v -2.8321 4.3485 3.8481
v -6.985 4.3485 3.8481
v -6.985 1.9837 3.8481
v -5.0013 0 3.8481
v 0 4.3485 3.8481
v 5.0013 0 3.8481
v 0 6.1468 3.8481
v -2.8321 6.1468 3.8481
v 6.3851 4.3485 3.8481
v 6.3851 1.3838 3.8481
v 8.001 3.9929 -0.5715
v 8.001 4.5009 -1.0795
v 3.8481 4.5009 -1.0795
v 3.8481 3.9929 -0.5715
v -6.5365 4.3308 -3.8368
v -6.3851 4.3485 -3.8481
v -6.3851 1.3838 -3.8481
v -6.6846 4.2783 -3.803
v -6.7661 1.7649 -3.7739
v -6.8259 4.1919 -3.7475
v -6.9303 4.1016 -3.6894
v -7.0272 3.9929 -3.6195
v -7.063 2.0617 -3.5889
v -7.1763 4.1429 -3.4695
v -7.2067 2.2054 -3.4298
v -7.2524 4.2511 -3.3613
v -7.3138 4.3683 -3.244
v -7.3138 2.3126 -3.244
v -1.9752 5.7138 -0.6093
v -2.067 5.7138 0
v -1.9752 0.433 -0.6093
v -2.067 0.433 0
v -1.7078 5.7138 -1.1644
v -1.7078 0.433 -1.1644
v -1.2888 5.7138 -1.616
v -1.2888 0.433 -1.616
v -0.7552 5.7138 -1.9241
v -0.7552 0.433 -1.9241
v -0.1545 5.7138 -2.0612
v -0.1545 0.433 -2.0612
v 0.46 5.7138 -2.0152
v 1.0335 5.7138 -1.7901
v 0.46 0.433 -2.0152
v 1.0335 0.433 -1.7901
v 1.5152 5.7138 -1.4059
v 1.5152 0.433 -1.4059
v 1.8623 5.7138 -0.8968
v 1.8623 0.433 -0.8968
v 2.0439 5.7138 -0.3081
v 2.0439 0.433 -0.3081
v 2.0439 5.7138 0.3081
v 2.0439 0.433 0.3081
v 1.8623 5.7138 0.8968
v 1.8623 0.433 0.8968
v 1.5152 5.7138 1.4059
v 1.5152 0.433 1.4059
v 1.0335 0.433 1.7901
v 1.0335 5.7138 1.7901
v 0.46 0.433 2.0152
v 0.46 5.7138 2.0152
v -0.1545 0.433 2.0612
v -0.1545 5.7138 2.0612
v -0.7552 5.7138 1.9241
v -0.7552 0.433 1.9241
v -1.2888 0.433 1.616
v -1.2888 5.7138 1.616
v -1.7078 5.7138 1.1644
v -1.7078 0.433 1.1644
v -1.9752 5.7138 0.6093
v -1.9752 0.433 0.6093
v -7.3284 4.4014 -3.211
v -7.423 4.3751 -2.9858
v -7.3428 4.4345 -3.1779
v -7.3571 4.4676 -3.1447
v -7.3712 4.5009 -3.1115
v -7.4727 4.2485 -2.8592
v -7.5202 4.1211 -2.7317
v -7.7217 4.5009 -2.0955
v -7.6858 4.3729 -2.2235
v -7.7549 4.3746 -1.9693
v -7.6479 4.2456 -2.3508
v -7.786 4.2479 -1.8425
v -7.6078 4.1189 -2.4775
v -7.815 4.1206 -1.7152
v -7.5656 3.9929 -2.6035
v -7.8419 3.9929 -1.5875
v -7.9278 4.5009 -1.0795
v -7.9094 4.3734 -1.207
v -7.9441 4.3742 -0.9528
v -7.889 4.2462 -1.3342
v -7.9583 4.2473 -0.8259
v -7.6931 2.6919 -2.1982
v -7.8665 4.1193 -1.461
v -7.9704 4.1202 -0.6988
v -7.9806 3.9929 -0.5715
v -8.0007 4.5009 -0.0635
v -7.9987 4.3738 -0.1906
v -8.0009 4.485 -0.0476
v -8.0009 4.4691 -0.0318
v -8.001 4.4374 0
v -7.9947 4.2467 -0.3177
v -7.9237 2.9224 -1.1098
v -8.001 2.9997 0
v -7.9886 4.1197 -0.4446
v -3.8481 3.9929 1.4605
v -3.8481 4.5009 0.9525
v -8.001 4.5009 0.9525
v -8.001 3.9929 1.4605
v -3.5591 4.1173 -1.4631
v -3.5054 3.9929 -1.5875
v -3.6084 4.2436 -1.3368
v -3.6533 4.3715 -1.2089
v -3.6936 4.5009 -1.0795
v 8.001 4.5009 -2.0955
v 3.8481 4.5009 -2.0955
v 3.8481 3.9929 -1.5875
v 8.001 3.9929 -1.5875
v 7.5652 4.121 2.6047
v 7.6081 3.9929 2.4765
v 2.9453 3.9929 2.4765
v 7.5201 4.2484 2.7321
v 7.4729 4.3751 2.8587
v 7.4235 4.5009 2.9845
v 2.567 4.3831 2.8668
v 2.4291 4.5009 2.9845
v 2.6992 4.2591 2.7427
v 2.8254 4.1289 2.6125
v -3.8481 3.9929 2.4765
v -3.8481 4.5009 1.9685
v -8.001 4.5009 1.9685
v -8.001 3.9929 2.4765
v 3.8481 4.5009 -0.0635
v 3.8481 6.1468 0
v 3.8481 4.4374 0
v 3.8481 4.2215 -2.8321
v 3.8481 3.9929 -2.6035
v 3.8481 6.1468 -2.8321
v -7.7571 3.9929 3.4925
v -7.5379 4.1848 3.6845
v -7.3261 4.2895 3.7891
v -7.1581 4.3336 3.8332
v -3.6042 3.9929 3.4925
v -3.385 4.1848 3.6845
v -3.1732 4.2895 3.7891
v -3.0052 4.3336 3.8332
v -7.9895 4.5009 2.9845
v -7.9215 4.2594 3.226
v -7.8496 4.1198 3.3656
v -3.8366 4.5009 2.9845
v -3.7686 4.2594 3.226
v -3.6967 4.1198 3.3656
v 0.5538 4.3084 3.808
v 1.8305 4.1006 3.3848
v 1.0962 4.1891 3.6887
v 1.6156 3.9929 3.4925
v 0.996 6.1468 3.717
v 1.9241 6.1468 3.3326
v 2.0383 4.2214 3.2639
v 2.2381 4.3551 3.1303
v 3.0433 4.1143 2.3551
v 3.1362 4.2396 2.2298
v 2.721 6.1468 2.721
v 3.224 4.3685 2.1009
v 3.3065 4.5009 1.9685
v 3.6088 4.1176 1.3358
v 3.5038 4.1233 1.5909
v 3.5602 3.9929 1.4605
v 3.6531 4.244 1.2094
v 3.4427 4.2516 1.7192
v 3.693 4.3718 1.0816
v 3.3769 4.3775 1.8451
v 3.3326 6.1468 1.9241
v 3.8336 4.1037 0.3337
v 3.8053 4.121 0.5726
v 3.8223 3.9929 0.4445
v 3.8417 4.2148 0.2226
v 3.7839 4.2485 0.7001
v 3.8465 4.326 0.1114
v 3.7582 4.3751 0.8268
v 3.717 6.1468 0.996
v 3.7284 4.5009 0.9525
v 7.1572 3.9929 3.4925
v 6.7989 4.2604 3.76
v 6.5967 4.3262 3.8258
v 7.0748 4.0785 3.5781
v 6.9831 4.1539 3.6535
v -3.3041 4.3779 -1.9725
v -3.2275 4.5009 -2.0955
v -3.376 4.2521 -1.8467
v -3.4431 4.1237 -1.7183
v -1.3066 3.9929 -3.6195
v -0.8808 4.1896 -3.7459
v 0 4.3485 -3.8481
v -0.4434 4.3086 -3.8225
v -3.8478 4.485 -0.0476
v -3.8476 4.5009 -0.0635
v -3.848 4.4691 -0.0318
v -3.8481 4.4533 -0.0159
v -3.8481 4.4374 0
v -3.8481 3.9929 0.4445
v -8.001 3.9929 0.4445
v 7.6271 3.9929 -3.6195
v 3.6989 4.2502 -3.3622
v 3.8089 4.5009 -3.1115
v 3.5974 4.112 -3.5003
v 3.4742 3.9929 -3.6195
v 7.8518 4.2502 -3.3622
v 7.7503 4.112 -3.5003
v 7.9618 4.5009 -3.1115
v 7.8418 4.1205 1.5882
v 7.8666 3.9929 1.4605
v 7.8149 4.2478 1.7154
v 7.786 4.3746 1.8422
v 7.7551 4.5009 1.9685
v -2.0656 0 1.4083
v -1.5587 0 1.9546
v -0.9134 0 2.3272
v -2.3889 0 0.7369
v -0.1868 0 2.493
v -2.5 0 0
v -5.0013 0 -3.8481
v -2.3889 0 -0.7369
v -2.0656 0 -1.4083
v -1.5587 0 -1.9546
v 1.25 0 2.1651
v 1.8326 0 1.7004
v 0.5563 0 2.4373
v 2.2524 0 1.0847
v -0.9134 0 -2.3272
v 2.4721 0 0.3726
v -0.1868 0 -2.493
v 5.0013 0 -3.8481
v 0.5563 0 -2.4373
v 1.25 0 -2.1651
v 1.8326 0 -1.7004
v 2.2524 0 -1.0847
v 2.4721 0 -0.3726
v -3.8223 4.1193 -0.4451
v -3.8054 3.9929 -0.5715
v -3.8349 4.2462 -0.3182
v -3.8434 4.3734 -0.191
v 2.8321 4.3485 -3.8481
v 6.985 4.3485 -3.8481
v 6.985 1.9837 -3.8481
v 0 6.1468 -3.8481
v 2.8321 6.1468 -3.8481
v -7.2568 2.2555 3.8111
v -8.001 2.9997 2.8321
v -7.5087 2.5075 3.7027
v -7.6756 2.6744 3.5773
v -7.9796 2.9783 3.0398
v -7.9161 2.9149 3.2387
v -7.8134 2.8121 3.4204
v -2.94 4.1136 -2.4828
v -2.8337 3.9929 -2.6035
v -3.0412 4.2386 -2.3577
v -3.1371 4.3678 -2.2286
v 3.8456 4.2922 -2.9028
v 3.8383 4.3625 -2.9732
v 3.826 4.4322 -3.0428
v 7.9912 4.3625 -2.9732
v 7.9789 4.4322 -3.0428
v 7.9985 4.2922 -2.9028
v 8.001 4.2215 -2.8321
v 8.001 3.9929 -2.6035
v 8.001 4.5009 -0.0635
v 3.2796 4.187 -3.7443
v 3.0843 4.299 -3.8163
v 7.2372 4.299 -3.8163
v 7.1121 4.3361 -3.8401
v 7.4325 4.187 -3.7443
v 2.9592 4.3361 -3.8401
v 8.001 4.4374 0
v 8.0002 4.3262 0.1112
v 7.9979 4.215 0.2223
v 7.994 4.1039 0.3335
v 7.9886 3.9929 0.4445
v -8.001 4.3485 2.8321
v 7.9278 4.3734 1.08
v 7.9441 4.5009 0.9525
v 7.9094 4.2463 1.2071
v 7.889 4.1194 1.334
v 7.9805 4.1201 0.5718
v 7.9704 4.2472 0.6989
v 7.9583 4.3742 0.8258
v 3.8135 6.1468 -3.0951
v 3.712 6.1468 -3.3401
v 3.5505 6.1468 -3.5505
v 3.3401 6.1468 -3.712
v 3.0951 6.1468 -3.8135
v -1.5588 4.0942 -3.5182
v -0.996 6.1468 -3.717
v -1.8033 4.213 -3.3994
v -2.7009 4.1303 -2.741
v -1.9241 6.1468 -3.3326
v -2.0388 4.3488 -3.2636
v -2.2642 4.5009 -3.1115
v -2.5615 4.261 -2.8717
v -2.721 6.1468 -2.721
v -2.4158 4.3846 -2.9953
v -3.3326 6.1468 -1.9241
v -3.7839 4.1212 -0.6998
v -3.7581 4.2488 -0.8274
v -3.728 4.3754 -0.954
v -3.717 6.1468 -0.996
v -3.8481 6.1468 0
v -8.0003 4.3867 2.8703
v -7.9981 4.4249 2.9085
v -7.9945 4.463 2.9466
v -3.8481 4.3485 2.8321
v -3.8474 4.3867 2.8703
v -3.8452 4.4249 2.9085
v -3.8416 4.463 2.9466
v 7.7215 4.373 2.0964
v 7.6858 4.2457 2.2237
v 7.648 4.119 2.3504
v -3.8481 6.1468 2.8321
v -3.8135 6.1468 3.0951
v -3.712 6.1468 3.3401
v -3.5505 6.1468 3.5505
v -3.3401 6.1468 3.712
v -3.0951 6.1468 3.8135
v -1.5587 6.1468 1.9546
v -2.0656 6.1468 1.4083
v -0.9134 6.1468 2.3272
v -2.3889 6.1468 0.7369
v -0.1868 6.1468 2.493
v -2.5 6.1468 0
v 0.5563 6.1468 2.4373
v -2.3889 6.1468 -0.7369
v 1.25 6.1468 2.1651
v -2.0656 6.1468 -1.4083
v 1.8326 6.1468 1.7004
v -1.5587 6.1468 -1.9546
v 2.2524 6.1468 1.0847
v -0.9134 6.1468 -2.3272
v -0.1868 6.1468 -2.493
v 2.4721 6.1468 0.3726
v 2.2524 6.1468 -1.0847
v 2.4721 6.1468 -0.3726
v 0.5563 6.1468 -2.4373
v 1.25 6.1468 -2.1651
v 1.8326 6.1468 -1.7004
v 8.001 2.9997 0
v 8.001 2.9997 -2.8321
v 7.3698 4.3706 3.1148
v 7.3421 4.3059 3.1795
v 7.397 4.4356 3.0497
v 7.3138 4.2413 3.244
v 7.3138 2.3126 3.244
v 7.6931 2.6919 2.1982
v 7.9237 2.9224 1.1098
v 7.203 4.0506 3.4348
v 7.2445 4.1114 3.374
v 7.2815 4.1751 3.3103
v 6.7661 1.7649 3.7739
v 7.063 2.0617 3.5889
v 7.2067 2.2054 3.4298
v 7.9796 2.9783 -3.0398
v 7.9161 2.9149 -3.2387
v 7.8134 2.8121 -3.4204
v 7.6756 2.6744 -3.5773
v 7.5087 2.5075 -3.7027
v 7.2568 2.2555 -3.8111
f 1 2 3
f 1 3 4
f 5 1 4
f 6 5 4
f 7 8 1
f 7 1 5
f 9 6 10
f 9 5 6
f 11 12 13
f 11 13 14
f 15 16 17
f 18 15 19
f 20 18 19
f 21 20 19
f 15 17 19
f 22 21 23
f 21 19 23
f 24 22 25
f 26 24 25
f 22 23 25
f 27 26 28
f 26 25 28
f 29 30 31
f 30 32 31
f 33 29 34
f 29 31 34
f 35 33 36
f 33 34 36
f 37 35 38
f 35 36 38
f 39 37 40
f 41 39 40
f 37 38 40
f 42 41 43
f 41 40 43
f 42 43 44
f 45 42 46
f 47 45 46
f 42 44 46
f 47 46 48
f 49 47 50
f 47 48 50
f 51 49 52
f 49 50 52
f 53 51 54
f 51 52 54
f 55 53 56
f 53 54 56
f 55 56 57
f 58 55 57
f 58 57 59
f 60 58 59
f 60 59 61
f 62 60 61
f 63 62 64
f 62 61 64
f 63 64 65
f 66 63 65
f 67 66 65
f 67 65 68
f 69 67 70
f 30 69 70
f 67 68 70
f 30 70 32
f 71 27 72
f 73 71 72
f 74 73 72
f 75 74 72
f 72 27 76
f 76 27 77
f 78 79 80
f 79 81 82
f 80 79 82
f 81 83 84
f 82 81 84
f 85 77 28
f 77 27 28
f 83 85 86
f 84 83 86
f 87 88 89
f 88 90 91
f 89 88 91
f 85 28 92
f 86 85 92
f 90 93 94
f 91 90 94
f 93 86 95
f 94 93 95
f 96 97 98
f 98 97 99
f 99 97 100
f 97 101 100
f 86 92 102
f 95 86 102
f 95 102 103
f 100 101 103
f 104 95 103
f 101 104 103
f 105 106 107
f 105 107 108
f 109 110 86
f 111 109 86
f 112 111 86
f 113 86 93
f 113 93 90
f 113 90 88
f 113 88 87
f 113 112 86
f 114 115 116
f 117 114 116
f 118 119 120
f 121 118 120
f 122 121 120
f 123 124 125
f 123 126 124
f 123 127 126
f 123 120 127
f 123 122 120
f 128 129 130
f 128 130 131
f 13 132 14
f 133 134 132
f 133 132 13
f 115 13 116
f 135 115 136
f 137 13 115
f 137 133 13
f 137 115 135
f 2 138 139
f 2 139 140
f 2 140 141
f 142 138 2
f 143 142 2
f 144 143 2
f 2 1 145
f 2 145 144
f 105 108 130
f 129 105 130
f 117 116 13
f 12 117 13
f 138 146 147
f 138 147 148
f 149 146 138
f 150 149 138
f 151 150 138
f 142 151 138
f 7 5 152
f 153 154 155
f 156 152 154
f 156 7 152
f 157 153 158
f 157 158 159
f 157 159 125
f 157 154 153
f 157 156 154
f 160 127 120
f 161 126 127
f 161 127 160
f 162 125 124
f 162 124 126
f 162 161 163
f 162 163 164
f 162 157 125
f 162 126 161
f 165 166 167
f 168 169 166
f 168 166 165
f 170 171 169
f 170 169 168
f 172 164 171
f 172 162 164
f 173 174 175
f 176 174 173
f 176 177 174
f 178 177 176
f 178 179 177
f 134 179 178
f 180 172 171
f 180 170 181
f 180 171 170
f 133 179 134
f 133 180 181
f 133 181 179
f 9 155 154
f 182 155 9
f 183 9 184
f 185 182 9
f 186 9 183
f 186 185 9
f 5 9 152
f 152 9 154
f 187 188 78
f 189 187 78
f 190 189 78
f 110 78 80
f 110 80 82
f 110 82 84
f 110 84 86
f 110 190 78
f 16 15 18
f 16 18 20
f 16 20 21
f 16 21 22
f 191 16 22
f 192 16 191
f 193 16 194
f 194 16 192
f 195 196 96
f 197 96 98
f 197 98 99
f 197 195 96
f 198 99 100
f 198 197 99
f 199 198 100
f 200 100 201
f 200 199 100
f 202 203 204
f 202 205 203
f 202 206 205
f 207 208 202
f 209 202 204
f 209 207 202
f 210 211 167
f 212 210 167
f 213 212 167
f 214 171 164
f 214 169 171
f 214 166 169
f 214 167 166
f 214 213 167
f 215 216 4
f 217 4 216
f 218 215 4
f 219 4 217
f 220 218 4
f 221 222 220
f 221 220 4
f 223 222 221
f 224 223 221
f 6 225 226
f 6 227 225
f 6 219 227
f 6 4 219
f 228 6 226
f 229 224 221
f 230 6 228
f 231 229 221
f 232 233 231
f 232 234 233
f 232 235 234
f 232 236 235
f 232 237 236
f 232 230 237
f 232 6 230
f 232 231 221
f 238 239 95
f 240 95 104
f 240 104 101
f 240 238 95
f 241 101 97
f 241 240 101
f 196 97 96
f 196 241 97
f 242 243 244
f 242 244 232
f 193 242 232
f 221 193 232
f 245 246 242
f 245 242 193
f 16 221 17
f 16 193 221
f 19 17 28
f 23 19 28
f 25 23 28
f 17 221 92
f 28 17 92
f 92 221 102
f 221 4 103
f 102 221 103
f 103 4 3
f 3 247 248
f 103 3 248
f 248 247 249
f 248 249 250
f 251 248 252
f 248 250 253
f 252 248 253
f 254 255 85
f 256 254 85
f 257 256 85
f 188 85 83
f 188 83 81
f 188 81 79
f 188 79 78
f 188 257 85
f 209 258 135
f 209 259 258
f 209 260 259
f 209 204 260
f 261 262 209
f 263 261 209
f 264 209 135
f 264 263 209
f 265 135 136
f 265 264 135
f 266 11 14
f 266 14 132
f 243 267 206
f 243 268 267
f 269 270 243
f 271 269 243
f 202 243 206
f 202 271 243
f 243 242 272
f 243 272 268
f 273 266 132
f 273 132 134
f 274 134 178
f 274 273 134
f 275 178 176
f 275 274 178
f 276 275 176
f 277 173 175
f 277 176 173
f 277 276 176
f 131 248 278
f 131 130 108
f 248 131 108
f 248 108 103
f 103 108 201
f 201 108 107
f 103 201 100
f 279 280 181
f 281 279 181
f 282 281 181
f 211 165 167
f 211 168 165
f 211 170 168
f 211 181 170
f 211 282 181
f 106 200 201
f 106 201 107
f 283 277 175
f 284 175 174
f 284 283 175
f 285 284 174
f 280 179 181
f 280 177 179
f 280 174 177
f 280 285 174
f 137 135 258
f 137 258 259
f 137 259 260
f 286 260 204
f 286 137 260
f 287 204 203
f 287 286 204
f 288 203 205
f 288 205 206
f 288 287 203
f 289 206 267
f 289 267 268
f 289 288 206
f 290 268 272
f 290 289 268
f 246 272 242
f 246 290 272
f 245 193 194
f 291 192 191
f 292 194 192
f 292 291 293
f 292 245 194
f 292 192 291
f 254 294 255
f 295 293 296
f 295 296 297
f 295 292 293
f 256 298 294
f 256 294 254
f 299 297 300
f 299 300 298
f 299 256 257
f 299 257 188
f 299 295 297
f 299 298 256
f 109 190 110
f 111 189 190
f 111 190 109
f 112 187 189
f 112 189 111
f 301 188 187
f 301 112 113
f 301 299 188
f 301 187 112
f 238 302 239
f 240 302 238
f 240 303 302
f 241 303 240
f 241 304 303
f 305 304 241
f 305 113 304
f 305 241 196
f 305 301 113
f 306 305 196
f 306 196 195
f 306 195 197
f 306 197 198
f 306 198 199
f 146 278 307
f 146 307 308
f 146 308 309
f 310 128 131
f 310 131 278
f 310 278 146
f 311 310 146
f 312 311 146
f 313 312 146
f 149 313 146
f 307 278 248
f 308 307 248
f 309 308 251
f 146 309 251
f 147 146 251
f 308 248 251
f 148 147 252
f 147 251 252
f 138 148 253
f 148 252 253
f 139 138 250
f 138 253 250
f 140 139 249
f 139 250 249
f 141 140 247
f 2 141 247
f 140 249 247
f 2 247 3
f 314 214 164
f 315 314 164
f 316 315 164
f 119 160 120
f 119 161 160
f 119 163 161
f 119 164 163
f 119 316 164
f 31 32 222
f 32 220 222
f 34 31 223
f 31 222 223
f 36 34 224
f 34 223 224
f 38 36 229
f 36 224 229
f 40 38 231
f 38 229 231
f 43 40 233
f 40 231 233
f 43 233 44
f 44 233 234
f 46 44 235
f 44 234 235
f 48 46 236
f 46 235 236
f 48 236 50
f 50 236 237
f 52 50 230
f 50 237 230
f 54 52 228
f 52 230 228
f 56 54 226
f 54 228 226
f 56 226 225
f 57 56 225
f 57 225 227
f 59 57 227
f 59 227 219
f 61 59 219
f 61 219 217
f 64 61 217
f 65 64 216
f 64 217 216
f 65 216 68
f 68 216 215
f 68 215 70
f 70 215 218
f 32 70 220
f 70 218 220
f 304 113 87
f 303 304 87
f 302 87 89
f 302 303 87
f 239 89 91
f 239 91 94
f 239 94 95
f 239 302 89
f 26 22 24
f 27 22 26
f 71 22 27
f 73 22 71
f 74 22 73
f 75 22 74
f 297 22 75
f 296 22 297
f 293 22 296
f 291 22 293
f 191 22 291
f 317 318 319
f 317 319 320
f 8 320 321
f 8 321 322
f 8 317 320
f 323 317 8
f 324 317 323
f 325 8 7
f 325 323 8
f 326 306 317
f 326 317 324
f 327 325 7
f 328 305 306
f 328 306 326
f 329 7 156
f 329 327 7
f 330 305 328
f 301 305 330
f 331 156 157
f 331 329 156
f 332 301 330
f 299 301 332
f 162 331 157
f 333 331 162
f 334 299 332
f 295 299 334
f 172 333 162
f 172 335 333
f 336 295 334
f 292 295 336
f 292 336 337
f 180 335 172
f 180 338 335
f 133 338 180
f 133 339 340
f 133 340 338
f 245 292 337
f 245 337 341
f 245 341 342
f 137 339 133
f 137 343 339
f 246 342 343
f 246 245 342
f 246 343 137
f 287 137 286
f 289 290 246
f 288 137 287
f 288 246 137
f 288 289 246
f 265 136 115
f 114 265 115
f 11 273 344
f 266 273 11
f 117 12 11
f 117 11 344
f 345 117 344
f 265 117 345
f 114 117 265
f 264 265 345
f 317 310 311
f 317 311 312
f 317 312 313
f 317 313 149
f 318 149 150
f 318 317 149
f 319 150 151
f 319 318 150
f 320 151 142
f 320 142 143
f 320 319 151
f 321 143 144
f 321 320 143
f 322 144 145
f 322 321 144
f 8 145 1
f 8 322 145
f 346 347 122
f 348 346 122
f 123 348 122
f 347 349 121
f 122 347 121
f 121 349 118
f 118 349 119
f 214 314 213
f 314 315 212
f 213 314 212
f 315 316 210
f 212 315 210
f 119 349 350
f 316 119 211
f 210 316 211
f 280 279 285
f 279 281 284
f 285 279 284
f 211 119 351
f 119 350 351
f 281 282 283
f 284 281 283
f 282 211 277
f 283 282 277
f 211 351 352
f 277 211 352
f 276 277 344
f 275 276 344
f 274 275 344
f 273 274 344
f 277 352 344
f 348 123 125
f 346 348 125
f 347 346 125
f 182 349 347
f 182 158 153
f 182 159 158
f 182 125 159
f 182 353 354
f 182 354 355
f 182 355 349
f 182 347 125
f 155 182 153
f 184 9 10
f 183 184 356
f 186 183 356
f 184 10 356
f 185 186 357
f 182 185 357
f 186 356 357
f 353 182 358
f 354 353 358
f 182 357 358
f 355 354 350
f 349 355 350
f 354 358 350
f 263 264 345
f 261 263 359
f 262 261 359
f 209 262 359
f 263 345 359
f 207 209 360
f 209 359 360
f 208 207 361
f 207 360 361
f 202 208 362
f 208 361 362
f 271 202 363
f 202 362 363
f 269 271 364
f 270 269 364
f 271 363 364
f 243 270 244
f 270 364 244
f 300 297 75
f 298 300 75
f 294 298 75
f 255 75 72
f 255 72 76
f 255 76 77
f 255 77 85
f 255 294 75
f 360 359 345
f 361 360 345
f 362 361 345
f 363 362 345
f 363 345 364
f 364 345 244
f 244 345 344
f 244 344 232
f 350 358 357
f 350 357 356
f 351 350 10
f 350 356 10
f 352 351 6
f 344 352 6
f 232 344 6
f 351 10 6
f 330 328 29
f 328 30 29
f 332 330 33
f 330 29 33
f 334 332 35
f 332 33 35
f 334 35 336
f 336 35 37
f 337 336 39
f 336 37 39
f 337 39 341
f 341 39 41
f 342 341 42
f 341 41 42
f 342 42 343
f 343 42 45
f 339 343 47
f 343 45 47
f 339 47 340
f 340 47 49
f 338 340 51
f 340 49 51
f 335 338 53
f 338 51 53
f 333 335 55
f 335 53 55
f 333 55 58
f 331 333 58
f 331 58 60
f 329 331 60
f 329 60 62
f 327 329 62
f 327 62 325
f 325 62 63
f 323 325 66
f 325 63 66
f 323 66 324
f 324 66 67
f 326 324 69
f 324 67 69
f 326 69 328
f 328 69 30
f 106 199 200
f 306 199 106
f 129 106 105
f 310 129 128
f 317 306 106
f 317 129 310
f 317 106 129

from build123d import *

# Parameters (mm, degrees)
BOSS_EXTRUDE1_DEPTH = 8.001
CUT_EXTRUDE1_DEPTH  = 7.6962
CUT_EXTRUDE2_DEPTH  = 7.6962
SKETCH8_W           = 32.004
SKETCH8_H           = 15.3924
CUT_EXTRUDE3_DEPTH  = 7.6962
BOSS_EXTRUDE2_DEPTH = 3.0734


with BuildPart() as part:
    # Sketch1 → Boss-Extrude1 (new body, symmetric)
    with BuildSketch(Plane(origin=(0, 0, 0), x_dir=(0, 0, -1), z_dir=(1, 0, 0))):
        Polygon((-3.8481, 4.34848), (-3.8481, 0), (3.8481, 0), (3.8481, 4.34848), (3.6195, 3.99288), (3.1115, 4.50088), (2.6035, 3.99288), (2.0955, 4.50088), (1.5875, 3.99288), (1.0795, 4.50088), (0.5715, 3.99288), (0.0635, 4.50088), (-0.4445, 3.99288), (-0.9525, 4.50088), (-1.4605, 3.99288), (-1.9685, 4.50088), (-2.4765, 3.99288), (-2.9845, 4.50088), (-3.4925, 3.99288), align=None)
    extrude(amount=BOSS_EXTRUDE1_DEPTH, both=True)

    # Sketch2 → Cut-Extrude1 (cut, symmetric)
    with BuildSketch(Plane.XY):
        Polygon((-10.541, 2.99974), (-10.541, -2.99974), (0, -2.99974), (0, 0), (-5.00126, 0), (-8.001, 2.99974), align=None)
    extrude(amount=CUT_EXTRUDE1_DEPTH, both=True, mode=Mode.SUBTRACT)

    # Sketch5 → Cut-Extrude2 (cut, symmetric)
    with BuildSketch(Plane.XY):
        Polygon((0, 0), (0, -2.99974), (10.541, -2.99974), (10.541, 2.99974), (8.001, 2.99974), (5.00126, 0), align=None)
    extrude(amount=CUT_EXTRUDE2_DEPTH, both=True, mode=Mode.SUBTRACT)

    # Sketch8 → Cut-Extrude3 (cut)
    with BuildSketch(Plane(origin=(0, 0, 0), x_dir=(1, 0, 0), z_dir=(0, 1, 0))):
        Rectangle(SKETCH8_W, SKETCH8_H)
        with BuildLine():
            Line((-6.985, -3.8481), (6.385094721, -3.8481))
            ThreePointArc((6.385094721, -3.8481), (6.939045596, -3.683800903), (7.313835784, -3.244041788))
            ThreePointArc((7.313835784, -3.244041788), (7.827323972, -1.658010991), (8.001, 0))
            Line((8.001, 0), (8.001, 2.8321))
            ThreePointArc((8.001, 2.8321), (7.70342049, 3.55052049), (6.985, 3.8481))
            Line((6.985, 3.8481), (-6.385094721, 3.8481))
            ThreePointArc((-6.385094721, 3.8481), (-6.939045596, 3.683800903), (-7.313835784, 3.244041788))
            ThreePointArc((-7.313835784, 3.244041788), (-7.827323972, 1.658010991), (-8.001, 0))
            Line((-8.001, 0), (-8.001, -2.8321))
            ThreePointArc((-8.001, -2.8321), (-7.70342049, -3.55052049), (-6.985, -3.8481))
        make_face(mode=Mode.SUBTRACT)
    extrude(amount=CUT_EXTRUDE3_DEPTH, mode=Mode.SUBTRACT)

    # Sketch9 → Boss-Extrude2 (add)
    with BuildSketch(Plane(origin=(0, 6.1468, 0), x_dir=(1, 0, 0), z_dir=(0, 1, 0))):
        with BuildLine():
            Line((-2.8321, -3.8481), (0, -3.8481))
            ThreePointArc((0, -3.8481), (2.721017605, -2.721017605), (3.8481, 0))
            Line((3.8481, 0), (3.8481, 2.8321))
            ThreePointArc((3.8481, 2.8321), (3.55052049, 3.55052049), (2.8321, 3.8481))
            Line((2.8321, 3.8481), (0, 3.8481))
            ThreePointArc((0, 3.8481), (-2.721017605, 2.721017605), (-3.8481, 0))
            Line((-3.8481, 0), (-3.8481, -2.8321))
            ThreePointArc((-3.8481, -2.8321), (-3.55052049, -3.55052049), (-2.8321, -3.8481))
        make_face()
    extrude(amount=-BOSS_EXTRUDE2_DEPTH)

    # Sketch10 → Cut-Revolve1 (revolve, cut)
    with BuildSketch(Plane(origin=(0, 6.1468, 0), x_dir=(-1, 0, 0), z_dir=(0, 0, 1))):
        Polygon((2.50000008, 6.1468), (0, 6.1468), (0, 0), (2.50000008, 0), (2.06699993, 0.433000023), (2.06699993, 5.713799977), align=None)
    revolve(axis=Axis((0, 6.45414, 0), (0, -1, 0)), mode=Mode.SUBTRACT)


solid = part.part
